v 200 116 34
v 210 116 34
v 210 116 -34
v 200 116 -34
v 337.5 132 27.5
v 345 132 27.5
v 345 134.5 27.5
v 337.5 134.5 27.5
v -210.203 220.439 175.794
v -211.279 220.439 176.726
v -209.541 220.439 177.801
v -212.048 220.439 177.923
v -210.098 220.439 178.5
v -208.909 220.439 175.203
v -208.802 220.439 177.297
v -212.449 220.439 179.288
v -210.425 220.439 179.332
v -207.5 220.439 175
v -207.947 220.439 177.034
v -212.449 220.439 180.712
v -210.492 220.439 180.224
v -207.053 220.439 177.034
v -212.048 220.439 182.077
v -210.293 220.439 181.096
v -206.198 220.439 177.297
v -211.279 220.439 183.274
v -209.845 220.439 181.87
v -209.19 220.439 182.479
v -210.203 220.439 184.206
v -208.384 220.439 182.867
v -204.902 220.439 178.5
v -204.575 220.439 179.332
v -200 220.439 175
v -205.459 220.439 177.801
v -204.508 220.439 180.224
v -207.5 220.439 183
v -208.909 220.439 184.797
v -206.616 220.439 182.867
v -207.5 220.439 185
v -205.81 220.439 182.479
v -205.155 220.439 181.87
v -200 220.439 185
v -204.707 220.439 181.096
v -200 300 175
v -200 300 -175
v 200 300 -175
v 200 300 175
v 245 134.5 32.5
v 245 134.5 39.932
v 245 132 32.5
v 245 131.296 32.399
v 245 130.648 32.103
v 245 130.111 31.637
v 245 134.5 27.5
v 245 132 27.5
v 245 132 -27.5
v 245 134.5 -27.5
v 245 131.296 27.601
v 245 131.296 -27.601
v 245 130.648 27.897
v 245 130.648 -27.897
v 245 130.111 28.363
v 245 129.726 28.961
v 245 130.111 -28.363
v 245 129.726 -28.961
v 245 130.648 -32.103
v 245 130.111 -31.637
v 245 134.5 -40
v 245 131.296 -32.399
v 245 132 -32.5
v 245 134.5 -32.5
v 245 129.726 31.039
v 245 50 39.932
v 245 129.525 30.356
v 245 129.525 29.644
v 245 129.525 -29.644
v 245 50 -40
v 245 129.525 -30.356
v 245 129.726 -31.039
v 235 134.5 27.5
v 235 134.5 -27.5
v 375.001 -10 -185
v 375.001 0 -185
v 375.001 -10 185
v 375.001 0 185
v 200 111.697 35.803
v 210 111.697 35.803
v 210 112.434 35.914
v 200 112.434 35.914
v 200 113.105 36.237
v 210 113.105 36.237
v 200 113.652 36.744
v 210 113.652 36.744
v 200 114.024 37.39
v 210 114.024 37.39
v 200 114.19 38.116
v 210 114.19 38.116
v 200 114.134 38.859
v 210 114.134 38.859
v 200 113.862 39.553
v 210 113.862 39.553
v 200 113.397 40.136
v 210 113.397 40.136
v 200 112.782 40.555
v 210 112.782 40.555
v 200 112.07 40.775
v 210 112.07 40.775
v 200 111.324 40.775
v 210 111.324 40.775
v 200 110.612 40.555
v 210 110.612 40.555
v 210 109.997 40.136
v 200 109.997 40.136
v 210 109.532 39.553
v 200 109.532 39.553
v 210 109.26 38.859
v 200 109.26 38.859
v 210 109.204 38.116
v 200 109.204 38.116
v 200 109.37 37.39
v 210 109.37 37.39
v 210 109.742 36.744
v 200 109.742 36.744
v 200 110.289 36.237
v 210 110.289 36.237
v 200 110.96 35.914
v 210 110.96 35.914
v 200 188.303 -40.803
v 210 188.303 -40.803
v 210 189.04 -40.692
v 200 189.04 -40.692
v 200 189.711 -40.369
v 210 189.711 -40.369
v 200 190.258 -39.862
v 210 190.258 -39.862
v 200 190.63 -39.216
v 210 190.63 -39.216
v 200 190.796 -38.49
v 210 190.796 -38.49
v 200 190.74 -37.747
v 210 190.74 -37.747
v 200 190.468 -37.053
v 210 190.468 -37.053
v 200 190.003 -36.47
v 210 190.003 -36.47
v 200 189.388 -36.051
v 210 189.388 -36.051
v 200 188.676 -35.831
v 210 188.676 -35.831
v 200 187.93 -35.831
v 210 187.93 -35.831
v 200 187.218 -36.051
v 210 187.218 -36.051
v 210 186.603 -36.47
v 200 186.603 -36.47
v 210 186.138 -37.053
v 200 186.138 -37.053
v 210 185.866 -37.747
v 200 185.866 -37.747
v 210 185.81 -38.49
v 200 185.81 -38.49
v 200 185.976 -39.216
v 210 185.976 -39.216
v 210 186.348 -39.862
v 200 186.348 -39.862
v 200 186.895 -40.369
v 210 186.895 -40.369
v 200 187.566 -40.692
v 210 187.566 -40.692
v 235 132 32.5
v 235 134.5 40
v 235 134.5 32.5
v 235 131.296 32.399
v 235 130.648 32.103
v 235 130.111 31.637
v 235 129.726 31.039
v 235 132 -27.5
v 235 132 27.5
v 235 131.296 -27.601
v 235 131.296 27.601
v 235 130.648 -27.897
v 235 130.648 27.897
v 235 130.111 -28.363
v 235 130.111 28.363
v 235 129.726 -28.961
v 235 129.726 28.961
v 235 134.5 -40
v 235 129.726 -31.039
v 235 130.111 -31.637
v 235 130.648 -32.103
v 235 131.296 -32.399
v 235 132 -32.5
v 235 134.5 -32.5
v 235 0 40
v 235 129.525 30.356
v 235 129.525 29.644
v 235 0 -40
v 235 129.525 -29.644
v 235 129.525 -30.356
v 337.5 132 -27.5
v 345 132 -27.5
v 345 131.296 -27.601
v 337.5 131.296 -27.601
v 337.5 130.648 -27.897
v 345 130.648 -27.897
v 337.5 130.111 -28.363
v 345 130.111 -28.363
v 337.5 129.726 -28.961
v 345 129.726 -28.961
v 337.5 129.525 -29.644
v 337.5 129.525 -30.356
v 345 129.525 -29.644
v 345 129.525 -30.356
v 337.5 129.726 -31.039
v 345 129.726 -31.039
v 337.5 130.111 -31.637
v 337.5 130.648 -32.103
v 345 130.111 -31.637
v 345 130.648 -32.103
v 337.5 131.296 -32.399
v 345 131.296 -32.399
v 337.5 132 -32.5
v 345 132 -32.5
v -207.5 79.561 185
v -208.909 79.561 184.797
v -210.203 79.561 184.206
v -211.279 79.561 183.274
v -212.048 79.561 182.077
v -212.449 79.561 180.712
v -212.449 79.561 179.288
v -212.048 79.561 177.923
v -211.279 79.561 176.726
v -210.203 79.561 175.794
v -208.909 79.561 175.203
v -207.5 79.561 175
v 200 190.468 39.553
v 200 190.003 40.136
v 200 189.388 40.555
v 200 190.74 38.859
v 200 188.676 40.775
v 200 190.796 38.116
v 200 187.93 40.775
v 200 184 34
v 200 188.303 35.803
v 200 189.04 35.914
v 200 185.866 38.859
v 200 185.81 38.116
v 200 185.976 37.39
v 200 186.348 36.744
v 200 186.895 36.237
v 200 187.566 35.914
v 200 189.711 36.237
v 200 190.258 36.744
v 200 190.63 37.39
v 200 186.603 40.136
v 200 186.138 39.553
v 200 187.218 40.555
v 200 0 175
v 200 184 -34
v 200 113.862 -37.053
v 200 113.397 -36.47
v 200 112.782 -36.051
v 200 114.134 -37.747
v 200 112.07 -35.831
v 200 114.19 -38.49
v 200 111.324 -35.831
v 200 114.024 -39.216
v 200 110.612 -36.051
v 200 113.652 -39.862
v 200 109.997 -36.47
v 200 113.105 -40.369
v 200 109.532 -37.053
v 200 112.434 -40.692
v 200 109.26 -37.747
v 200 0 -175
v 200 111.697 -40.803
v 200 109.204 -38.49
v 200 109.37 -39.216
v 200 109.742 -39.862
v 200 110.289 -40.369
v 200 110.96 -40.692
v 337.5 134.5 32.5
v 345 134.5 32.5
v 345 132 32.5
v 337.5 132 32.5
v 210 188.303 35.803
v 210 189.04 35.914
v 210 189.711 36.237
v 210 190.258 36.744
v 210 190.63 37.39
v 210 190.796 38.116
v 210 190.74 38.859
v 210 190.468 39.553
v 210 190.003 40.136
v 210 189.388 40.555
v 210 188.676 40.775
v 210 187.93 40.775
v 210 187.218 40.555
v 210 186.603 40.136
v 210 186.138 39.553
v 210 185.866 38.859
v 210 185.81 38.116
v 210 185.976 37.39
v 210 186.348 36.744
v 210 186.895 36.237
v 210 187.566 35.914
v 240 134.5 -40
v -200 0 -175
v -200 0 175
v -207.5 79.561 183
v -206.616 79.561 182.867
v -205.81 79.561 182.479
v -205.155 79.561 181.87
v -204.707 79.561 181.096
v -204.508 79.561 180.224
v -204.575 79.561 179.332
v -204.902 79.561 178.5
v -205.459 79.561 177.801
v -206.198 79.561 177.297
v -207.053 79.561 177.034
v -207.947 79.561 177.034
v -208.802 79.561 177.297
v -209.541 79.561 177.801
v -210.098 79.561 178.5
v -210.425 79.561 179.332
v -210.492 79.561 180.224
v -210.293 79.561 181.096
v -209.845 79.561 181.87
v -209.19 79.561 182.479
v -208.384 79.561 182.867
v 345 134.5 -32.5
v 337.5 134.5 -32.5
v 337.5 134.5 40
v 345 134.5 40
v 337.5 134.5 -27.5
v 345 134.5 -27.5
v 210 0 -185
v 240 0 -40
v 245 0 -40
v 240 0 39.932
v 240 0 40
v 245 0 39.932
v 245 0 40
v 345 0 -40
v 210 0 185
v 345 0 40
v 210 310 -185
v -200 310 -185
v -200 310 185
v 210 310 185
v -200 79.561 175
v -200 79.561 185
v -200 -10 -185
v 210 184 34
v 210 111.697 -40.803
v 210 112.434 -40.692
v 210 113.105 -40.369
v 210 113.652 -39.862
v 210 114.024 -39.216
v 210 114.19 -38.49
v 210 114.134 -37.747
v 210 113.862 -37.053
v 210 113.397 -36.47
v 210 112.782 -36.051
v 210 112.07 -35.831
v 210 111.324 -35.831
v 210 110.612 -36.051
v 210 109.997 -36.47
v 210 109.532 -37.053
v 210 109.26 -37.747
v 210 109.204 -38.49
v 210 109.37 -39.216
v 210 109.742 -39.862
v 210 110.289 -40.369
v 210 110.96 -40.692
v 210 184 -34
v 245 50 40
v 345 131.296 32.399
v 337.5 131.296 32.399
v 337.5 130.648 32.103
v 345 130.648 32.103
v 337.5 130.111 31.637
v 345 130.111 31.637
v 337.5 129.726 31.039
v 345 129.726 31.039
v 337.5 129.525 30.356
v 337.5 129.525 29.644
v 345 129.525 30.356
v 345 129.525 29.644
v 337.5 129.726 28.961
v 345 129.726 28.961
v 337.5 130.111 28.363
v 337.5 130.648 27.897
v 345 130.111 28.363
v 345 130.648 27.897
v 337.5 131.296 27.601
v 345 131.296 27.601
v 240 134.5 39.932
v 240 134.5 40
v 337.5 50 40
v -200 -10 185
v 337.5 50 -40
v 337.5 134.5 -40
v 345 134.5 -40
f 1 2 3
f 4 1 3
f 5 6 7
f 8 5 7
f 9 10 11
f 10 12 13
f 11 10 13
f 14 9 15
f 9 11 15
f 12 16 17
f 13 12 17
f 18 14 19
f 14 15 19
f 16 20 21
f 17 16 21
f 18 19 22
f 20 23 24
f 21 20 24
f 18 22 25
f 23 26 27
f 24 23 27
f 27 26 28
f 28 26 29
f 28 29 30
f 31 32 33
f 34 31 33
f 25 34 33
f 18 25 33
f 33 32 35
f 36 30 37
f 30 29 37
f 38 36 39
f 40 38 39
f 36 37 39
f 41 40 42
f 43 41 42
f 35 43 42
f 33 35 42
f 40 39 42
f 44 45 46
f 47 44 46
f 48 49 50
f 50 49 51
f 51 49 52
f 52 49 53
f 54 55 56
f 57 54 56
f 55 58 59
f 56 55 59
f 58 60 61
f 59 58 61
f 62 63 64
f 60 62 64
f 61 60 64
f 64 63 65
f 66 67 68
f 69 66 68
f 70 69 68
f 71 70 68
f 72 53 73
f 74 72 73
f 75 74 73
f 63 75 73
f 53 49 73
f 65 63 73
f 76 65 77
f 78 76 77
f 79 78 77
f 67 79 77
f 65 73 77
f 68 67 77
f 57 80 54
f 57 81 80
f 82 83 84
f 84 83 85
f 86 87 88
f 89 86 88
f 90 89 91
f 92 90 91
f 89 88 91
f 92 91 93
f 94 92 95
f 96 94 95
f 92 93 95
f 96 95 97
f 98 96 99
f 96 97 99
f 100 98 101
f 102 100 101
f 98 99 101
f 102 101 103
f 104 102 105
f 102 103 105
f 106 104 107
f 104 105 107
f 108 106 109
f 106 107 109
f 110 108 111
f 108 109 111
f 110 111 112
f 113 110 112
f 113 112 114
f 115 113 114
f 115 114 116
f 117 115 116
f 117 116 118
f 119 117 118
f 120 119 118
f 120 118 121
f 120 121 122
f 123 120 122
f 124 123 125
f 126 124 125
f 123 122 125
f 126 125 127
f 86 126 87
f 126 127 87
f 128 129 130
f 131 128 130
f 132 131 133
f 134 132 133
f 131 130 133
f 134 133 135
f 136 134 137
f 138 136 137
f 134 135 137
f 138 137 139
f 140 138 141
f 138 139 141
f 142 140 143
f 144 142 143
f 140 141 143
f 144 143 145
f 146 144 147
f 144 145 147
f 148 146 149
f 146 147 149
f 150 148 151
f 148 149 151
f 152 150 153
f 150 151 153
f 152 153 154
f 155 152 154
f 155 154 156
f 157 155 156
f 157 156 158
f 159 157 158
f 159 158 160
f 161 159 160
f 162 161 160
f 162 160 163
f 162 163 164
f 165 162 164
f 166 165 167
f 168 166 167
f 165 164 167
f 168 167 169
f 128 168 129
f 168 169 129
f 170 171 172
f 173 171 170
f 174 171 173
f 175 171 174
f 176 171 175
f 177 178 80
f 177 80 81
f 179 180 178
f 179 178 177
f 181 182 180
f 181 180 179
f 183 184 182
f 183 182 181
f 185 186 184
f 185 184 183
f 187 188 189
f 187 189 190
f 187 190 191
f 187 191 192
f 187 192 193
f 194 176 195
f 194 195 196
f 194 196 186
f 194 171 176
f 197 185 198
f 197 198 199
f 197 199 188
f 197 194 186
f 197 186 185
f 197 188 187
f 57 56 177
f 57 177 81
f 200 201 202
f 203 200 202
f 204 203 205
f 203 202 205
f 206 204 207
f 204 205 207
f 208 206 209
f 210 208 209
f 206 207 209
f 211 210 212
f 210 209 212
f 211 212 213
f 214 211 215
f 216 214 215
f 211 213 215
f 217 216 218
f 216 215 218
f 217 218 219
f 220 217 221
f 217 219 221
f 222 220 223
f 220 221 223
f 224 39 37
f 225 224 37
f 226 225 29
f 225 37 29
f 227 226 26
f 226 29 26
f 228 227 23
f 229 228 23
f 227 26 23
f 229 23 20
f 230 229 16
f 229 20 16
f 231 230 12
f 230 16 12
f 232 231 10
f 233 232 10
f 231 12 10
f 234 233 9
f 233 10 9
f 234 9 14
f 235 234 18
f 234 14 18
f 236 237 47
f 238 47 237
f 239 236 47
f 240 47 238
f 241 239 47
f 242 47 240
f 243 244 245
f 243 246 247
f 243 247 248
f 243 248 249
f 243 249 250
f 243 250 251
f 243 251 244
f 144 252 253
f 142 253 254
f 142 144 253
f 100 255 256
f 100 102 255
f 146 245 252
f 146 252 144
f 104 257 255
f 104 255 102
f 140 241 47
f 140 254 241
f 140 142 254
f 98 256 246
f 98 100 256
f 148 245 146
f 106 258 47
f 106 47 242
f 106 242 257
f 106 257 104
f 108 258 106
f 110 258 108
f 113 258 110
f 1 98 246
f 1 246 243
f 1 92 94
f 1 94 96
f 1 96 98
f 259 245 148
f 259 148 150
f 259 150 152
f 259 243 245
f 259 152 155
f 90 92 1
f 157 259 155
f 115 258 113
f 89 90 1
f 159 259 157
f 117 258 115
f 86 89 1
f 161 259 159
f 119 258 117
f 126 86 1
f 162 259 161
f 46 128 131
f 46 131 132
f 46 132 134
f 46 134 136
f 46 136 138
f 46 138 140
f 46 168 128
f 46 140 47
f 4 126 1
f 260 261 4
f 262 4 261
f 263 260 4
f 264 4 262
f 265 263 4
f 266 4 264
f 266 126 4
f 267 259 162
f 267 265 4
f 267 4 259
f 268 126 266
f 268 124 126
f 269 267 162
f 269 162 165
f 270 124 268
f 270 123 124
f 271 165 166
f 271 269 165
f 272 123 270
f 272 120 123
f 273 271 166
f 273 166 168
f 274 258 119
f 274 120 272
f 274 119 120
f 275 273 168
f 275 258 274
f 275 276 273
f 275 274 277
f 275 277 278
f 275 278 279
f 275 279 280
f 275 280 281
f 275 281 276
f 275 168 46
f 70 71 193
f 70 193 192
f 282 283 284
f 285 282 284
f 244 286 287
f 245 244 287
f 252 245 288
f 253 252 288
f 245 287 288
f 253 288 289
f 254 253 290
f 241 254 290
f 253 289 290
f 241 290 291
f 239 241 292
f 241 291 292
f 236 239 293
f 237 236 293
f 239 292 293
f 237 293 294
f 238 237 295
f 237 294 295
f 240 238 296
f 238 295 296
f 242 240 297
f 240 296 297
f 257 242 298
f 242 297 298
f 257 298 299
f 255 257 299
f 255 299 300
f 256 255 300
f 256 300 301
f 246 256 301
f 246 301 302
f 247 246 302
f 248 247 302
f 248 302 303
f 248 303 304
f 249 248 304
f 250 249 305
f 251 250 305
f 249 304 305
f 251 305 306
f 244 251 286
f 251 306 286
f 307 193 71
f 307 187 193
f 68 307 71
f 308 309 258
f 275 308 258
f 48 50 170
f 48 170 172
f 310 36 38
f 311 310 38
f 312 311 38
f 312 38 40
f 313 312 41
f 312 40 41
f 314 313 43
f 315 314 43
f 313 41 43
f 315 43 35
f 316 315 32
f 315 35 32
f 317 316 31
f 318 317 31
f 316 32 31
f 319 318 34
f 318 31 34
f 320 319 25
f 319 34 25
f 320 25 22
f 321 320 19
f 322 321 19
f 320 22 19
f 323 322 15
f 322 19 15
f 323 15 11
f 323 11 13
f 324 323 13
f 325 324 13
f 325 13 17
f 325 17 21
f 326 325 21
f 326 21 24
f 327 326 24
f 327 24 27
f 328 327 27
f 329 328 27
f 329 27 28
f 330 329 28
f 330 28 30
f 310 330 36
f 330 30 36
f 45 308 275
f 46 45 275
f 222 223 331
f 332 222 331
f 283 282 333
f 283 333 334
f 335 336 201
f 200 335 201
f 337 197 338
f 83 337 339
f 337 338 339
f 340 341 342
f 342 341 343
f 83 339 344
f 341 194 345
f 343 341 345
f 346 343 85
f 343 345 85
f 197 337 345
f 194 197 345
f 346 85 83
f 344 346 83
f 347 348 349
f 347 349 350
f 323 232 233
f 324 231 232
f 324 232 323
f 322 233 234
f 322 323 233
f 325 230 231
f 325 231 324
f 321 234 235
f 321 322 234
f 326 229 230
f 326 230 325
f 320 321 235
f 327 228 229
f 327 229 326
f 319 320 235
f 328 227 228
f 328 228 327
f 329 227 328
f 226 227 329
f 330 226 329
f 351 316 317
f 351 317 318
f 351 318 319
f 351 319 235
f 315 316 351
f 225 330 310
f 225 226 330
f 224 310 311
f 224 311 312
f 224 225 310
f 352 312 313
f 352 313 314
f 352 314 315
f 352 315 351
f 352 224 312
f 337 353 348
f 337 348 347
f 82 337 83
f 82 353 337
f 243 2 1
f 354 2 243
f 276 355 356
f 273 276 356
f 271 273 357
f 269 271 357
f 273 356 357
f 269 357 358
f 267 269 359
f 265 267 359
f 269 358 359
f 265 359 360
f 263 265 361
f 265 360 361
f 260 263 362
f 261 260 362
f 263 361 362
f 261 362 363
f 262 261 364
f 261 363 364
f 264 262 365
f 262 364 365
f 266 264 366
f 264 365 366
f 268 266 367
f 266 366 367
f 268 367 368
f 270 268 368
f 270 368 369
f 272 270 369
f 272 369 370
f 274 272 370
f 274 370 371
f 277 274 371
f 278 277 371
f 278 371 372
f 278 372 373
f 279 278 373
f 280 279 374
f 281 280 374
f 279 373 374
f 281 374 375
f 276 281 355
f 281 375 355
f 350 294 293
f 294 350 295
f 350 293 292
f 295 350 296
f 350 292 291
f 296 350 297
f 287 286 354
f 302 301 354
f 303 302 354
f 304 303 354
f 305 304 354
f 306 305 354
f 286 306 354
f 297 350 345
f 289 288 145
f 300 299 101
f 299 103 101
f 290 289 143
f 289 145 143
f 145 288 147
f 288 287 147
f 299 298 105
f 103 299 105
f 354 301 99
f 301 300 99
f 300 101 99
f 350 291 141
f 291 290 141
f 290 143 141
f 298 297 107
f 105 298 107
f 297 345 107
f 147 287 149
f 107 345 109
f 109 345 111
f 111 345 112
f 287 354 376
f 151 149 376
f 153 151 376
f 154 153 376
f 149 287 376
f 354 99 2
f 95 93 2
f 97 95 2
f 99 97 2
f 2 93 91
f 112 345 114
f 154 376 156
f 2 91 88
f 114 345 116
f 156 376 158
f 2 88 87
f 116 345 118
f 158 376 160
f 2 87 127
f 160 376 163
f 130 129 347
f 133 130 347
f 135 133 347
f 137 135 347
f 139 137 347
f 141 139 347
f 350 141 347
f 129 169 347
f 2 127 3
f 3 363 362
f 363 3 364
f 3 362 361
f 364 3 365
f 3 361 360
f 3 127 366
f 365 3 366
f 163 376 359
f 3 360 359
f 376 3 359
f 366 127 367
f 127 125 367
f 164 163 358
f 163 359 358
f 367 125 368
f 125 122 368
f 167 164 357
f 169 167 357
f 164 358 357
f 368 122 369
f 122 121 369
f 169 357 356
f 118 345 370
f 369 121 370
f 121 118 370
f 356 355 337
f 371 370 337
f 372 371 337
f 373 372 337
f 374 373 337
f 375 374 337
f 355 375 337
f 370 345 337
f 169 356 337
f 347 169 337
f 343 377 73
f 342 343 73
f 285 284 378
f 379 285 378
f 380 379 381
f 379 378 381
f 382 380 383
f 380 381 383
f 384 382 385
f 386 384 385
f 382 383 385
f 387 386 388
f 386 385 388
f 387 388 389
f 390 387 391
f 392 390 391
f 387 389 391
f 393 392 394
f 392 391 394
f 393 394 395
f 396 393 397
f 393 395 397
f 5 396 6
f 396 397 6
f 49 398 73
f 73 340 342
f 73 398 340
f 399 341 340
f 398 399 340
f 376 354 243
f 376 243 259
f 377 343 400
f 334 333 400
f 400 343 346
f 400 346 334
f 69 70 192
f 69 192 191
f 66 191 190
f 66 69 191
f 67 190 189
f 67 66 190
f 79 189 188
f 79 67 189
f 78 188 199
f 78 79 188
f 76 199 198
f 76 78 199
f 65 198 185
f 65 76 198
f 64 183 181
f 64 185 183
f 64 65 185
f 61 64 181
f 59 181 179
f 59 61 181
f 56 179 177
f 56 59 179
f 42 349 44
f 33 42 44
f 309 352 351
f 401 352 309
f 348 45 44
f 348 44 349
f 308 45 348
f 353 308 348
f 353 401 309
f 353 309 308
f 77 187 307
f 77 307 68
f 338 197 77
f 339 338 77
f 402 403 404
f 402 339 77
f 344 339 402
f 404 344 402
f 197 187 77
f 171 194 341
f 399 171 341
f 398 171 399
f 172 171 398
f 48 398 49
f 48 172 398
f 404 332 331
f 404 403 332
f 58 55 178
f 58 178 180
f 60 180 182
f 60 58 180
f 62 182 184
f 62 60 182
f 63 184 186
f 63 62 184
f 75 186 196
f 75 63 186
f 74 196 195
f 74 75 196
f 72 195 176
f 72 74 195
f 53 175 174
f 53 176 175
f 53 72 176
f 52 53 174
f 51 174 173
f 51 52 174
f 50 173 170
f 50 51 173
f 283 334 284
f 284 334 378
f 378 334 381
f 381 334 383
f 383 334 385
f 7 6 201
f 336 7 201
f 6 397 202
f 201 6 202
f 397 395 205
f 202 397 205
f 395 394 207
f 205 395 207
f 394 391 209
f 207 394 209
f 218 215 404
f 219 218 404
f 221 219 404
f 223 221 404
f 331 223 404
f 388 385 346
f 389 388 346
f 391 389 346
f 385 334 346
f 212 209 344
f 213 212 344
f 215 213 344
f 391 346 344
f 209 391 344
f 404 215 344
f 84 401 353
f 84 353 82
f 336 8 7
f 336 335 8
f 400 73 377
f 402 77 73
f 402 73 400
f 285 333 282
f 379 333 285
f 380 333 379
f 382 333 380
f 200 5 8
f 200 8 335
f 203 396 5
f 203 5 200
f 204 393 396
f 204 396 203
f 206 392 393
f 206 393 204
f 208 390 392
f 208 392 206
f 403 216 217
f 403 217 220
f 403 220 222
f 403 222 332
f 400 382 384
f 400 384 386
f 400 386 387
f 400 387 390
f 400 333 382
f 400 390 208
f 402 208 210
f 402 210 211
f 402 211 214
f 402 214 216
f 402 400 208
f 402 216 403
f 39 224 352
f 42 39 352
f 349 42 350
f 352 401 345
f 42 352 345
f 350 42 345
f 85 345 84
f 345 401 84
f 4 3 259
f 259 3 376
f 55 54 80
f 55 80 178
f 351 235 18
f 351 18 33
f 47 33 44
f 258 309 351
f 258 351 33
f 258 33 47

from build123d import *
from build123d.topology import SkipClean

# Parameters (mm, degrees)
SKETCH1_W           = 420
SKETCH1_H           = 370
SKETCH1_W_2         = 400
SKETCH1_H_2         = 350
BOSS_EXTRUDE1_DEPTH = 300
BOSS_EXTRUDE2_DEPTH = 10
SKETCH3_W           = 10
SKETCH3_H           = 310
CUT_EXTRUDE1_DEPTH  = 370
SKETCH6_R           = 2.5
SKETCH6_W           = 68
SKETCH6_H           = 68
CUT_EXTRUDE3_DEPTH  = 10
SKETCH7_W           = 5
SKETCH7_H           = 80
BOSS_EXTRUDE3_DEPTH = 134.5
CUT_EXTRUDE4_REACH  = 646.845
SKETCH9_W           = 5
SKETCH9_H           = 79.931817825
BOSS_EXTRUDE4_DEPTH = 134.5
CUT_EXTRUDE5_REACH  = 516.637
SKETCH10_W          = 6.47899954
SKETCH10_H          = 82.791783562
SKETCH11_W          = 5
SKETCH11_H          = 80
BOSS_EXTRUDE5_DEPTH = 134.5
SKETCH12_W          = 92.5
SKETCH12_H          = 80
BOSS_EXTRUDE6_DEPTH = 50
CUT_EXTRUDE6_START  = -7.5
CUT_EXTRUDE6_DEPTH  = 105
SKETCH15_W          = 410
SKETCH15_H          = 370
BOSS_EXTRUDE7_DEPTH = 10
SKETCH16_W          = 15
SKETCH16_H          = 140.878076228
BOSS_EXTRUDE8_DEPTH = 10
SKETCH17_R          = 3
CUT_EXTRUDE7_DEPTH  = 140.878076229


with BuildPart() as part:
    # Sketch1 → Boss-Extrude1 (new body)
    with BuildSketch(Plane(origin=(0, 0, 0), x_dir=(1, 0, 0), z_dir=(0, 1, 0))):
        Rectangle(SKETCH1_W, SKETCH1_H)
        Rectangle(SKETCH1_W_2, SKETCH1_H_2, mode=Mode.SUBTRACT)
    extrude(amount=BOSS_EXTRUDE1_DEPTH)

    # Sketch2 → Boss-Extrude2 (add)
    with BuildSketch(Plane.XZ):
        Polygon((-210, -185), (210, -185), (215.001407023, -185), (375.001407023, -185), (375.001407023, 185), (215.001407023, 185), (210, 185), (-210, 185), align=None)
    extrude(amount=BOSS_EXTRUDE2_DEPTH)

    # Sketch3 → Cut-Extrude1 (cut)
    with BuildSketch(Plane.XY.offset(185)):
        with Locations((-205, 145)):
            Rectangle(SKETCH3_W, SKETCH3_H)
    extrude(amount=-CUT_EXTRUDE1_DEPTH, mode=Mode.SUBTRACT)

    # Sketch6 → Cut-Extrude3 (cut)
    with BuildSketch(Plane(origin=(210, 0, 0), x_dir=(0, 0, -1), z_dir=(1, 0, 0))):
        with Locations((-38.303, 111.697)):
            Circle(SKETCH6_R)
        with Locations((38.303, 111.697)):
            Circle(SKETCH6_R)
        with Locations((38.303, 188.303)):
            Circle(SKETCH6_R)
        with Locations((-38.303, 188.303)):
            Circle(SKETCH6_R)
        with Locations((0, 150)):
            Rectangle(SKETCH6_W, SKETCH6_H)
    extrude(amount=-CUT_EXTRUDE3_DEPTH, mode=Mode.SUBTRACT)

    # Sketch7 → Boss-Extrude3 (add)
    with BuildSketch(Plane(origin=(0, 0, 0), x_dir=(1, 0, 0), z_dir=(0, 1, 0))):
        with Locations((237.5, 0)):
            Rectangle(SKETCH7_W, SKETCH7_H)
        with Locations((337.5, 0)):
            Rectangle(SKETCH7_W, SKETCH7_H)
    extrude(amount=BOSS_EXTRUDE3_DEPTH)

    # Cut-Extrude4: up to this face of the body (flat: up to its plane)
    cut_extrude4_end = Plane(part.part.faces().sort_by_distance((235, 67.25, 0))[0])
    # Sketch8 → Cut-Extrude4 (cut, up to the picked face)
    with BuildSketch(Plane(origin=(340, 0, 0), x_dir=(0, 0, -1), z_dir=(1, 0, 0)), mode=Mode.PRIVATE) as cut_extrude4_sk1:
        with BuildLine():
            Line((-32.5, 136.110518), (-32.220758703, 136.631471953))
            Line((-32.220758703, 136.631471953), (-27.5, 136.631471953))
            Line((-27.5, 136.631471953), (-27.5, 132))
            ThreePointArc((-27.5, 132), (-30, 129.5), (-32.5, 132))
            Line((-32.5, 132), (-32.5, 136.110518))
        make_face()
    cut_extrude4_tool1 = split(extrude(cut_extrude4_sk1.sketch, amount=-CUT_EXTRUDE4_REACH, mode=Mode.PRIVATE), bisect_by=cut_extrude4_end, keep=Keep.BOTH, mode=Mode.PRIVATE)
    # Sketch8 → Cut-Extrude4 (cut, up to the picked face)
    with BuildSketch(Plane(origin=(340, 0, 0), x_dir=(0, 0, -1), z_dir=(1, 0, 0)), mode=Mode.PRIVATE) as cut_extrude4_sk2:
        with BuildLine():
            Line((27.5, 132), (27.5, 136.631471953))
            Line((27.5, 136.631471953), (32.220758703, 136.631471953))
            Line((32.220758703, 136.631471953), (32.5, 136.110518))
            Line((32.5, 136.110518), (32.5, 132))
            ThreePointArc((32.5, 132), (30, 129.5), (27.5, 132))
        make_face()
    cut_extrude4_tool2 = split(extrude(cut_extrude4_sk2.sketch, amount=-CUT_EXTRUDE4_REACH, mode=Mode.PRIVATE), bisect_by=cut_extrude4_end, keep=Keep.BOTH, mode=Mode.PRIVATE)
    add(cut_extrude4_tool1.solids().sort_by(Axis((340, 133.303425, 29.994679), (-1, 0, 0)))[0], mode=Mode.SUBTRACT)
    add(cut_extrude4_tool2.solids().sort_by(Axis((340, 133.303425, -29.994679), (-1, 0, 0)))[0], mode=Mode.SUBTRACT)

    # Sketch9 → Boss-Extrude4 (add)
    with BuildSketch(Plane(origin=(0, 0, 0), x_dir=(1, 0, 0), z_dir=(0, 1, 0))):
        with Locations((242.5, 0.034091087)):
            Rectangle(SKETCH9_W, SKETCH9_H)
    extrude(amount=BOSS_EXTRUDE4_DEPTH)

    # Cut-Extrude5: up to this face of the body (flat: up to its plane)
    cut_extrude5_end = Plane(part.part.faces().sort_by_distance((337.5, 134.5, 0))[0])
    # Sketch10 → Cut-Extrude5 (cut, up to the picked face)
    with BuildSketch(Plane(origin=(0, 0, 0), x_dir=(1, 0, 0), z_dir=(0, 1, 0)), mode=Mode.PRIVATE) as cut_extrude5_sk1:
        with Locations((334.26050023, 1.395891781)):
            Rectangle(SKETCH10_W, SKETCH10_H)
    cut_extrude5_tool1 = split(extrude(cut_extrude5_sk1.sketch, amount=CUT_EXTRUDE5_REACH, mode=Mode.PRIVATE), bisect_by=cut_extrude5_end, keep=Keep.BOTH, mode=Mode.PRIVATE)
    add(cut_extrude5_tool1.solids().sort_by(Axis((334.2605, 0, -1.395892), (0, 1, 0)))[0], mode=Mode.SUBTRACT)

    # Sketch11 → Boss-Extrude5 (add)
    with BuildSketch(Plane(origin=(0, 0, 0), x_dir=(1, 0, 0), z_dir=(0, 1, 0))):
        with Locations((342.5, 0)):
            Rectangle(SKETCH11_W, SKETCH11_H)
    extrude(amount=BOSS_EXTRUDE5_DEPTH)

    # Sketch12 → Boss-Extrude6 (add)
    with BuildSketch(Plane(origin=(0, 0, 0), x_dir=(1, 0, 0), z_dir=(0, 1, 0))):
        with Locations((291.25, 0)):
            Rectangle(SKETCH12_W, SKETCH12_H)
    extrude(amount=BOSS_EXTRUDE6_DEPTH)

    # Sketch13 → Cut-Extrude6 (cut)
    with SkipClean():  # the faces are left unmerged after this step: merging them gives an invalid solid
        with BuildSketch(Plane.ZY.offset(-337.5).offset(CUT_EXTRUDE6_START)):
            with BuildLine():
                Line((-32.5, 132), (-32.5, 134.5))
                Line((-32.5, 134.5), (-27.5, 134.5))
                Line((-27.5, 134.5), (-27.5, 132))
                ThreePointArc((-27.5, 132), (-30, 129.5), (-32.5, 132))
            make_face()
            with BuildLine():
                Line((27.5, 132), (27.5, 134.5))
                Line((27.5, 134.5), (32.5, 134.5))
                Line((32.5, 134.5), (32.5, 132))
                ThreePointArc((32.5, 132), (30, 129.5), (27.5, 132))
            make_face()
        extrude(amount=CUT_EXTRUDE6_DEPTH, mode=Mode.SUBTRACT)
    add(part.part.scale(1), mode=Mode.REPLACE)  # the faces are merged on a copy

    # Sketch15 → Boss-Extrude7 (add)
    with BuildSketch(Plane(origin=(0, 300, 0), x_dir=(1, 0, 0), z_dir=(0, 1, 0))):
        with Locations((5, 0)):
            Rectangle(SKETCH15_W, SKETCH15_H)
    extrude(amount=BOSS_EXTRUDE7_DEPTH)

    # Sketch16 → Boss-Extrude8 (add)
    with BuildSketch(Plane.XY.offset(185)):
        with Locations((-207.5, 150)):
            Rectangle(SKETCH16_W, SKETCH16_H)
    extrude(amount=-BOSS_EXTRUDE8_DEPTH)

    # Sketch17 → Cut-Extrude7 (cut)
    with BuildSketch(Plane(origin=(0, 220.439038114, 0), x_dir=(1, 0, 0), z_dir=(0, 1, 0))):
        with Locations(Location((-207.5, -180, 0), (0, 0, 270))):
            Circle(SKETCH17_R)
        with BuildLine():
            Line((-207.5, -175), (-209.035864649, -172.521100774))
            Line((-209.035864649, -172.521100774), (-216.595230293, -172.09067426))
            Line((-216.595230293, -172.09067426), (-221.114708685, -175.883807911))
            Line((-221.114708685, -175.883807911), (-223.315292371, -184.798763984))
            Line((-223.315292371, -184.798763984), (-213.821165317, -189.967050938))
            Line((-213.821165317, -189.967050938), (-207.069572146, -188.808886591))
            Line((-207.069572146, -188.808886591), (-207.5, -185))
            ThreePointArc((-207.5, -185), (-212.5, -180), (-207.5, -175))
        make_face()
    extrude(amount=-CUT_EXTRUDE7_DEPTH, mode=Mode.SUBTRACT)


solid = part.part
